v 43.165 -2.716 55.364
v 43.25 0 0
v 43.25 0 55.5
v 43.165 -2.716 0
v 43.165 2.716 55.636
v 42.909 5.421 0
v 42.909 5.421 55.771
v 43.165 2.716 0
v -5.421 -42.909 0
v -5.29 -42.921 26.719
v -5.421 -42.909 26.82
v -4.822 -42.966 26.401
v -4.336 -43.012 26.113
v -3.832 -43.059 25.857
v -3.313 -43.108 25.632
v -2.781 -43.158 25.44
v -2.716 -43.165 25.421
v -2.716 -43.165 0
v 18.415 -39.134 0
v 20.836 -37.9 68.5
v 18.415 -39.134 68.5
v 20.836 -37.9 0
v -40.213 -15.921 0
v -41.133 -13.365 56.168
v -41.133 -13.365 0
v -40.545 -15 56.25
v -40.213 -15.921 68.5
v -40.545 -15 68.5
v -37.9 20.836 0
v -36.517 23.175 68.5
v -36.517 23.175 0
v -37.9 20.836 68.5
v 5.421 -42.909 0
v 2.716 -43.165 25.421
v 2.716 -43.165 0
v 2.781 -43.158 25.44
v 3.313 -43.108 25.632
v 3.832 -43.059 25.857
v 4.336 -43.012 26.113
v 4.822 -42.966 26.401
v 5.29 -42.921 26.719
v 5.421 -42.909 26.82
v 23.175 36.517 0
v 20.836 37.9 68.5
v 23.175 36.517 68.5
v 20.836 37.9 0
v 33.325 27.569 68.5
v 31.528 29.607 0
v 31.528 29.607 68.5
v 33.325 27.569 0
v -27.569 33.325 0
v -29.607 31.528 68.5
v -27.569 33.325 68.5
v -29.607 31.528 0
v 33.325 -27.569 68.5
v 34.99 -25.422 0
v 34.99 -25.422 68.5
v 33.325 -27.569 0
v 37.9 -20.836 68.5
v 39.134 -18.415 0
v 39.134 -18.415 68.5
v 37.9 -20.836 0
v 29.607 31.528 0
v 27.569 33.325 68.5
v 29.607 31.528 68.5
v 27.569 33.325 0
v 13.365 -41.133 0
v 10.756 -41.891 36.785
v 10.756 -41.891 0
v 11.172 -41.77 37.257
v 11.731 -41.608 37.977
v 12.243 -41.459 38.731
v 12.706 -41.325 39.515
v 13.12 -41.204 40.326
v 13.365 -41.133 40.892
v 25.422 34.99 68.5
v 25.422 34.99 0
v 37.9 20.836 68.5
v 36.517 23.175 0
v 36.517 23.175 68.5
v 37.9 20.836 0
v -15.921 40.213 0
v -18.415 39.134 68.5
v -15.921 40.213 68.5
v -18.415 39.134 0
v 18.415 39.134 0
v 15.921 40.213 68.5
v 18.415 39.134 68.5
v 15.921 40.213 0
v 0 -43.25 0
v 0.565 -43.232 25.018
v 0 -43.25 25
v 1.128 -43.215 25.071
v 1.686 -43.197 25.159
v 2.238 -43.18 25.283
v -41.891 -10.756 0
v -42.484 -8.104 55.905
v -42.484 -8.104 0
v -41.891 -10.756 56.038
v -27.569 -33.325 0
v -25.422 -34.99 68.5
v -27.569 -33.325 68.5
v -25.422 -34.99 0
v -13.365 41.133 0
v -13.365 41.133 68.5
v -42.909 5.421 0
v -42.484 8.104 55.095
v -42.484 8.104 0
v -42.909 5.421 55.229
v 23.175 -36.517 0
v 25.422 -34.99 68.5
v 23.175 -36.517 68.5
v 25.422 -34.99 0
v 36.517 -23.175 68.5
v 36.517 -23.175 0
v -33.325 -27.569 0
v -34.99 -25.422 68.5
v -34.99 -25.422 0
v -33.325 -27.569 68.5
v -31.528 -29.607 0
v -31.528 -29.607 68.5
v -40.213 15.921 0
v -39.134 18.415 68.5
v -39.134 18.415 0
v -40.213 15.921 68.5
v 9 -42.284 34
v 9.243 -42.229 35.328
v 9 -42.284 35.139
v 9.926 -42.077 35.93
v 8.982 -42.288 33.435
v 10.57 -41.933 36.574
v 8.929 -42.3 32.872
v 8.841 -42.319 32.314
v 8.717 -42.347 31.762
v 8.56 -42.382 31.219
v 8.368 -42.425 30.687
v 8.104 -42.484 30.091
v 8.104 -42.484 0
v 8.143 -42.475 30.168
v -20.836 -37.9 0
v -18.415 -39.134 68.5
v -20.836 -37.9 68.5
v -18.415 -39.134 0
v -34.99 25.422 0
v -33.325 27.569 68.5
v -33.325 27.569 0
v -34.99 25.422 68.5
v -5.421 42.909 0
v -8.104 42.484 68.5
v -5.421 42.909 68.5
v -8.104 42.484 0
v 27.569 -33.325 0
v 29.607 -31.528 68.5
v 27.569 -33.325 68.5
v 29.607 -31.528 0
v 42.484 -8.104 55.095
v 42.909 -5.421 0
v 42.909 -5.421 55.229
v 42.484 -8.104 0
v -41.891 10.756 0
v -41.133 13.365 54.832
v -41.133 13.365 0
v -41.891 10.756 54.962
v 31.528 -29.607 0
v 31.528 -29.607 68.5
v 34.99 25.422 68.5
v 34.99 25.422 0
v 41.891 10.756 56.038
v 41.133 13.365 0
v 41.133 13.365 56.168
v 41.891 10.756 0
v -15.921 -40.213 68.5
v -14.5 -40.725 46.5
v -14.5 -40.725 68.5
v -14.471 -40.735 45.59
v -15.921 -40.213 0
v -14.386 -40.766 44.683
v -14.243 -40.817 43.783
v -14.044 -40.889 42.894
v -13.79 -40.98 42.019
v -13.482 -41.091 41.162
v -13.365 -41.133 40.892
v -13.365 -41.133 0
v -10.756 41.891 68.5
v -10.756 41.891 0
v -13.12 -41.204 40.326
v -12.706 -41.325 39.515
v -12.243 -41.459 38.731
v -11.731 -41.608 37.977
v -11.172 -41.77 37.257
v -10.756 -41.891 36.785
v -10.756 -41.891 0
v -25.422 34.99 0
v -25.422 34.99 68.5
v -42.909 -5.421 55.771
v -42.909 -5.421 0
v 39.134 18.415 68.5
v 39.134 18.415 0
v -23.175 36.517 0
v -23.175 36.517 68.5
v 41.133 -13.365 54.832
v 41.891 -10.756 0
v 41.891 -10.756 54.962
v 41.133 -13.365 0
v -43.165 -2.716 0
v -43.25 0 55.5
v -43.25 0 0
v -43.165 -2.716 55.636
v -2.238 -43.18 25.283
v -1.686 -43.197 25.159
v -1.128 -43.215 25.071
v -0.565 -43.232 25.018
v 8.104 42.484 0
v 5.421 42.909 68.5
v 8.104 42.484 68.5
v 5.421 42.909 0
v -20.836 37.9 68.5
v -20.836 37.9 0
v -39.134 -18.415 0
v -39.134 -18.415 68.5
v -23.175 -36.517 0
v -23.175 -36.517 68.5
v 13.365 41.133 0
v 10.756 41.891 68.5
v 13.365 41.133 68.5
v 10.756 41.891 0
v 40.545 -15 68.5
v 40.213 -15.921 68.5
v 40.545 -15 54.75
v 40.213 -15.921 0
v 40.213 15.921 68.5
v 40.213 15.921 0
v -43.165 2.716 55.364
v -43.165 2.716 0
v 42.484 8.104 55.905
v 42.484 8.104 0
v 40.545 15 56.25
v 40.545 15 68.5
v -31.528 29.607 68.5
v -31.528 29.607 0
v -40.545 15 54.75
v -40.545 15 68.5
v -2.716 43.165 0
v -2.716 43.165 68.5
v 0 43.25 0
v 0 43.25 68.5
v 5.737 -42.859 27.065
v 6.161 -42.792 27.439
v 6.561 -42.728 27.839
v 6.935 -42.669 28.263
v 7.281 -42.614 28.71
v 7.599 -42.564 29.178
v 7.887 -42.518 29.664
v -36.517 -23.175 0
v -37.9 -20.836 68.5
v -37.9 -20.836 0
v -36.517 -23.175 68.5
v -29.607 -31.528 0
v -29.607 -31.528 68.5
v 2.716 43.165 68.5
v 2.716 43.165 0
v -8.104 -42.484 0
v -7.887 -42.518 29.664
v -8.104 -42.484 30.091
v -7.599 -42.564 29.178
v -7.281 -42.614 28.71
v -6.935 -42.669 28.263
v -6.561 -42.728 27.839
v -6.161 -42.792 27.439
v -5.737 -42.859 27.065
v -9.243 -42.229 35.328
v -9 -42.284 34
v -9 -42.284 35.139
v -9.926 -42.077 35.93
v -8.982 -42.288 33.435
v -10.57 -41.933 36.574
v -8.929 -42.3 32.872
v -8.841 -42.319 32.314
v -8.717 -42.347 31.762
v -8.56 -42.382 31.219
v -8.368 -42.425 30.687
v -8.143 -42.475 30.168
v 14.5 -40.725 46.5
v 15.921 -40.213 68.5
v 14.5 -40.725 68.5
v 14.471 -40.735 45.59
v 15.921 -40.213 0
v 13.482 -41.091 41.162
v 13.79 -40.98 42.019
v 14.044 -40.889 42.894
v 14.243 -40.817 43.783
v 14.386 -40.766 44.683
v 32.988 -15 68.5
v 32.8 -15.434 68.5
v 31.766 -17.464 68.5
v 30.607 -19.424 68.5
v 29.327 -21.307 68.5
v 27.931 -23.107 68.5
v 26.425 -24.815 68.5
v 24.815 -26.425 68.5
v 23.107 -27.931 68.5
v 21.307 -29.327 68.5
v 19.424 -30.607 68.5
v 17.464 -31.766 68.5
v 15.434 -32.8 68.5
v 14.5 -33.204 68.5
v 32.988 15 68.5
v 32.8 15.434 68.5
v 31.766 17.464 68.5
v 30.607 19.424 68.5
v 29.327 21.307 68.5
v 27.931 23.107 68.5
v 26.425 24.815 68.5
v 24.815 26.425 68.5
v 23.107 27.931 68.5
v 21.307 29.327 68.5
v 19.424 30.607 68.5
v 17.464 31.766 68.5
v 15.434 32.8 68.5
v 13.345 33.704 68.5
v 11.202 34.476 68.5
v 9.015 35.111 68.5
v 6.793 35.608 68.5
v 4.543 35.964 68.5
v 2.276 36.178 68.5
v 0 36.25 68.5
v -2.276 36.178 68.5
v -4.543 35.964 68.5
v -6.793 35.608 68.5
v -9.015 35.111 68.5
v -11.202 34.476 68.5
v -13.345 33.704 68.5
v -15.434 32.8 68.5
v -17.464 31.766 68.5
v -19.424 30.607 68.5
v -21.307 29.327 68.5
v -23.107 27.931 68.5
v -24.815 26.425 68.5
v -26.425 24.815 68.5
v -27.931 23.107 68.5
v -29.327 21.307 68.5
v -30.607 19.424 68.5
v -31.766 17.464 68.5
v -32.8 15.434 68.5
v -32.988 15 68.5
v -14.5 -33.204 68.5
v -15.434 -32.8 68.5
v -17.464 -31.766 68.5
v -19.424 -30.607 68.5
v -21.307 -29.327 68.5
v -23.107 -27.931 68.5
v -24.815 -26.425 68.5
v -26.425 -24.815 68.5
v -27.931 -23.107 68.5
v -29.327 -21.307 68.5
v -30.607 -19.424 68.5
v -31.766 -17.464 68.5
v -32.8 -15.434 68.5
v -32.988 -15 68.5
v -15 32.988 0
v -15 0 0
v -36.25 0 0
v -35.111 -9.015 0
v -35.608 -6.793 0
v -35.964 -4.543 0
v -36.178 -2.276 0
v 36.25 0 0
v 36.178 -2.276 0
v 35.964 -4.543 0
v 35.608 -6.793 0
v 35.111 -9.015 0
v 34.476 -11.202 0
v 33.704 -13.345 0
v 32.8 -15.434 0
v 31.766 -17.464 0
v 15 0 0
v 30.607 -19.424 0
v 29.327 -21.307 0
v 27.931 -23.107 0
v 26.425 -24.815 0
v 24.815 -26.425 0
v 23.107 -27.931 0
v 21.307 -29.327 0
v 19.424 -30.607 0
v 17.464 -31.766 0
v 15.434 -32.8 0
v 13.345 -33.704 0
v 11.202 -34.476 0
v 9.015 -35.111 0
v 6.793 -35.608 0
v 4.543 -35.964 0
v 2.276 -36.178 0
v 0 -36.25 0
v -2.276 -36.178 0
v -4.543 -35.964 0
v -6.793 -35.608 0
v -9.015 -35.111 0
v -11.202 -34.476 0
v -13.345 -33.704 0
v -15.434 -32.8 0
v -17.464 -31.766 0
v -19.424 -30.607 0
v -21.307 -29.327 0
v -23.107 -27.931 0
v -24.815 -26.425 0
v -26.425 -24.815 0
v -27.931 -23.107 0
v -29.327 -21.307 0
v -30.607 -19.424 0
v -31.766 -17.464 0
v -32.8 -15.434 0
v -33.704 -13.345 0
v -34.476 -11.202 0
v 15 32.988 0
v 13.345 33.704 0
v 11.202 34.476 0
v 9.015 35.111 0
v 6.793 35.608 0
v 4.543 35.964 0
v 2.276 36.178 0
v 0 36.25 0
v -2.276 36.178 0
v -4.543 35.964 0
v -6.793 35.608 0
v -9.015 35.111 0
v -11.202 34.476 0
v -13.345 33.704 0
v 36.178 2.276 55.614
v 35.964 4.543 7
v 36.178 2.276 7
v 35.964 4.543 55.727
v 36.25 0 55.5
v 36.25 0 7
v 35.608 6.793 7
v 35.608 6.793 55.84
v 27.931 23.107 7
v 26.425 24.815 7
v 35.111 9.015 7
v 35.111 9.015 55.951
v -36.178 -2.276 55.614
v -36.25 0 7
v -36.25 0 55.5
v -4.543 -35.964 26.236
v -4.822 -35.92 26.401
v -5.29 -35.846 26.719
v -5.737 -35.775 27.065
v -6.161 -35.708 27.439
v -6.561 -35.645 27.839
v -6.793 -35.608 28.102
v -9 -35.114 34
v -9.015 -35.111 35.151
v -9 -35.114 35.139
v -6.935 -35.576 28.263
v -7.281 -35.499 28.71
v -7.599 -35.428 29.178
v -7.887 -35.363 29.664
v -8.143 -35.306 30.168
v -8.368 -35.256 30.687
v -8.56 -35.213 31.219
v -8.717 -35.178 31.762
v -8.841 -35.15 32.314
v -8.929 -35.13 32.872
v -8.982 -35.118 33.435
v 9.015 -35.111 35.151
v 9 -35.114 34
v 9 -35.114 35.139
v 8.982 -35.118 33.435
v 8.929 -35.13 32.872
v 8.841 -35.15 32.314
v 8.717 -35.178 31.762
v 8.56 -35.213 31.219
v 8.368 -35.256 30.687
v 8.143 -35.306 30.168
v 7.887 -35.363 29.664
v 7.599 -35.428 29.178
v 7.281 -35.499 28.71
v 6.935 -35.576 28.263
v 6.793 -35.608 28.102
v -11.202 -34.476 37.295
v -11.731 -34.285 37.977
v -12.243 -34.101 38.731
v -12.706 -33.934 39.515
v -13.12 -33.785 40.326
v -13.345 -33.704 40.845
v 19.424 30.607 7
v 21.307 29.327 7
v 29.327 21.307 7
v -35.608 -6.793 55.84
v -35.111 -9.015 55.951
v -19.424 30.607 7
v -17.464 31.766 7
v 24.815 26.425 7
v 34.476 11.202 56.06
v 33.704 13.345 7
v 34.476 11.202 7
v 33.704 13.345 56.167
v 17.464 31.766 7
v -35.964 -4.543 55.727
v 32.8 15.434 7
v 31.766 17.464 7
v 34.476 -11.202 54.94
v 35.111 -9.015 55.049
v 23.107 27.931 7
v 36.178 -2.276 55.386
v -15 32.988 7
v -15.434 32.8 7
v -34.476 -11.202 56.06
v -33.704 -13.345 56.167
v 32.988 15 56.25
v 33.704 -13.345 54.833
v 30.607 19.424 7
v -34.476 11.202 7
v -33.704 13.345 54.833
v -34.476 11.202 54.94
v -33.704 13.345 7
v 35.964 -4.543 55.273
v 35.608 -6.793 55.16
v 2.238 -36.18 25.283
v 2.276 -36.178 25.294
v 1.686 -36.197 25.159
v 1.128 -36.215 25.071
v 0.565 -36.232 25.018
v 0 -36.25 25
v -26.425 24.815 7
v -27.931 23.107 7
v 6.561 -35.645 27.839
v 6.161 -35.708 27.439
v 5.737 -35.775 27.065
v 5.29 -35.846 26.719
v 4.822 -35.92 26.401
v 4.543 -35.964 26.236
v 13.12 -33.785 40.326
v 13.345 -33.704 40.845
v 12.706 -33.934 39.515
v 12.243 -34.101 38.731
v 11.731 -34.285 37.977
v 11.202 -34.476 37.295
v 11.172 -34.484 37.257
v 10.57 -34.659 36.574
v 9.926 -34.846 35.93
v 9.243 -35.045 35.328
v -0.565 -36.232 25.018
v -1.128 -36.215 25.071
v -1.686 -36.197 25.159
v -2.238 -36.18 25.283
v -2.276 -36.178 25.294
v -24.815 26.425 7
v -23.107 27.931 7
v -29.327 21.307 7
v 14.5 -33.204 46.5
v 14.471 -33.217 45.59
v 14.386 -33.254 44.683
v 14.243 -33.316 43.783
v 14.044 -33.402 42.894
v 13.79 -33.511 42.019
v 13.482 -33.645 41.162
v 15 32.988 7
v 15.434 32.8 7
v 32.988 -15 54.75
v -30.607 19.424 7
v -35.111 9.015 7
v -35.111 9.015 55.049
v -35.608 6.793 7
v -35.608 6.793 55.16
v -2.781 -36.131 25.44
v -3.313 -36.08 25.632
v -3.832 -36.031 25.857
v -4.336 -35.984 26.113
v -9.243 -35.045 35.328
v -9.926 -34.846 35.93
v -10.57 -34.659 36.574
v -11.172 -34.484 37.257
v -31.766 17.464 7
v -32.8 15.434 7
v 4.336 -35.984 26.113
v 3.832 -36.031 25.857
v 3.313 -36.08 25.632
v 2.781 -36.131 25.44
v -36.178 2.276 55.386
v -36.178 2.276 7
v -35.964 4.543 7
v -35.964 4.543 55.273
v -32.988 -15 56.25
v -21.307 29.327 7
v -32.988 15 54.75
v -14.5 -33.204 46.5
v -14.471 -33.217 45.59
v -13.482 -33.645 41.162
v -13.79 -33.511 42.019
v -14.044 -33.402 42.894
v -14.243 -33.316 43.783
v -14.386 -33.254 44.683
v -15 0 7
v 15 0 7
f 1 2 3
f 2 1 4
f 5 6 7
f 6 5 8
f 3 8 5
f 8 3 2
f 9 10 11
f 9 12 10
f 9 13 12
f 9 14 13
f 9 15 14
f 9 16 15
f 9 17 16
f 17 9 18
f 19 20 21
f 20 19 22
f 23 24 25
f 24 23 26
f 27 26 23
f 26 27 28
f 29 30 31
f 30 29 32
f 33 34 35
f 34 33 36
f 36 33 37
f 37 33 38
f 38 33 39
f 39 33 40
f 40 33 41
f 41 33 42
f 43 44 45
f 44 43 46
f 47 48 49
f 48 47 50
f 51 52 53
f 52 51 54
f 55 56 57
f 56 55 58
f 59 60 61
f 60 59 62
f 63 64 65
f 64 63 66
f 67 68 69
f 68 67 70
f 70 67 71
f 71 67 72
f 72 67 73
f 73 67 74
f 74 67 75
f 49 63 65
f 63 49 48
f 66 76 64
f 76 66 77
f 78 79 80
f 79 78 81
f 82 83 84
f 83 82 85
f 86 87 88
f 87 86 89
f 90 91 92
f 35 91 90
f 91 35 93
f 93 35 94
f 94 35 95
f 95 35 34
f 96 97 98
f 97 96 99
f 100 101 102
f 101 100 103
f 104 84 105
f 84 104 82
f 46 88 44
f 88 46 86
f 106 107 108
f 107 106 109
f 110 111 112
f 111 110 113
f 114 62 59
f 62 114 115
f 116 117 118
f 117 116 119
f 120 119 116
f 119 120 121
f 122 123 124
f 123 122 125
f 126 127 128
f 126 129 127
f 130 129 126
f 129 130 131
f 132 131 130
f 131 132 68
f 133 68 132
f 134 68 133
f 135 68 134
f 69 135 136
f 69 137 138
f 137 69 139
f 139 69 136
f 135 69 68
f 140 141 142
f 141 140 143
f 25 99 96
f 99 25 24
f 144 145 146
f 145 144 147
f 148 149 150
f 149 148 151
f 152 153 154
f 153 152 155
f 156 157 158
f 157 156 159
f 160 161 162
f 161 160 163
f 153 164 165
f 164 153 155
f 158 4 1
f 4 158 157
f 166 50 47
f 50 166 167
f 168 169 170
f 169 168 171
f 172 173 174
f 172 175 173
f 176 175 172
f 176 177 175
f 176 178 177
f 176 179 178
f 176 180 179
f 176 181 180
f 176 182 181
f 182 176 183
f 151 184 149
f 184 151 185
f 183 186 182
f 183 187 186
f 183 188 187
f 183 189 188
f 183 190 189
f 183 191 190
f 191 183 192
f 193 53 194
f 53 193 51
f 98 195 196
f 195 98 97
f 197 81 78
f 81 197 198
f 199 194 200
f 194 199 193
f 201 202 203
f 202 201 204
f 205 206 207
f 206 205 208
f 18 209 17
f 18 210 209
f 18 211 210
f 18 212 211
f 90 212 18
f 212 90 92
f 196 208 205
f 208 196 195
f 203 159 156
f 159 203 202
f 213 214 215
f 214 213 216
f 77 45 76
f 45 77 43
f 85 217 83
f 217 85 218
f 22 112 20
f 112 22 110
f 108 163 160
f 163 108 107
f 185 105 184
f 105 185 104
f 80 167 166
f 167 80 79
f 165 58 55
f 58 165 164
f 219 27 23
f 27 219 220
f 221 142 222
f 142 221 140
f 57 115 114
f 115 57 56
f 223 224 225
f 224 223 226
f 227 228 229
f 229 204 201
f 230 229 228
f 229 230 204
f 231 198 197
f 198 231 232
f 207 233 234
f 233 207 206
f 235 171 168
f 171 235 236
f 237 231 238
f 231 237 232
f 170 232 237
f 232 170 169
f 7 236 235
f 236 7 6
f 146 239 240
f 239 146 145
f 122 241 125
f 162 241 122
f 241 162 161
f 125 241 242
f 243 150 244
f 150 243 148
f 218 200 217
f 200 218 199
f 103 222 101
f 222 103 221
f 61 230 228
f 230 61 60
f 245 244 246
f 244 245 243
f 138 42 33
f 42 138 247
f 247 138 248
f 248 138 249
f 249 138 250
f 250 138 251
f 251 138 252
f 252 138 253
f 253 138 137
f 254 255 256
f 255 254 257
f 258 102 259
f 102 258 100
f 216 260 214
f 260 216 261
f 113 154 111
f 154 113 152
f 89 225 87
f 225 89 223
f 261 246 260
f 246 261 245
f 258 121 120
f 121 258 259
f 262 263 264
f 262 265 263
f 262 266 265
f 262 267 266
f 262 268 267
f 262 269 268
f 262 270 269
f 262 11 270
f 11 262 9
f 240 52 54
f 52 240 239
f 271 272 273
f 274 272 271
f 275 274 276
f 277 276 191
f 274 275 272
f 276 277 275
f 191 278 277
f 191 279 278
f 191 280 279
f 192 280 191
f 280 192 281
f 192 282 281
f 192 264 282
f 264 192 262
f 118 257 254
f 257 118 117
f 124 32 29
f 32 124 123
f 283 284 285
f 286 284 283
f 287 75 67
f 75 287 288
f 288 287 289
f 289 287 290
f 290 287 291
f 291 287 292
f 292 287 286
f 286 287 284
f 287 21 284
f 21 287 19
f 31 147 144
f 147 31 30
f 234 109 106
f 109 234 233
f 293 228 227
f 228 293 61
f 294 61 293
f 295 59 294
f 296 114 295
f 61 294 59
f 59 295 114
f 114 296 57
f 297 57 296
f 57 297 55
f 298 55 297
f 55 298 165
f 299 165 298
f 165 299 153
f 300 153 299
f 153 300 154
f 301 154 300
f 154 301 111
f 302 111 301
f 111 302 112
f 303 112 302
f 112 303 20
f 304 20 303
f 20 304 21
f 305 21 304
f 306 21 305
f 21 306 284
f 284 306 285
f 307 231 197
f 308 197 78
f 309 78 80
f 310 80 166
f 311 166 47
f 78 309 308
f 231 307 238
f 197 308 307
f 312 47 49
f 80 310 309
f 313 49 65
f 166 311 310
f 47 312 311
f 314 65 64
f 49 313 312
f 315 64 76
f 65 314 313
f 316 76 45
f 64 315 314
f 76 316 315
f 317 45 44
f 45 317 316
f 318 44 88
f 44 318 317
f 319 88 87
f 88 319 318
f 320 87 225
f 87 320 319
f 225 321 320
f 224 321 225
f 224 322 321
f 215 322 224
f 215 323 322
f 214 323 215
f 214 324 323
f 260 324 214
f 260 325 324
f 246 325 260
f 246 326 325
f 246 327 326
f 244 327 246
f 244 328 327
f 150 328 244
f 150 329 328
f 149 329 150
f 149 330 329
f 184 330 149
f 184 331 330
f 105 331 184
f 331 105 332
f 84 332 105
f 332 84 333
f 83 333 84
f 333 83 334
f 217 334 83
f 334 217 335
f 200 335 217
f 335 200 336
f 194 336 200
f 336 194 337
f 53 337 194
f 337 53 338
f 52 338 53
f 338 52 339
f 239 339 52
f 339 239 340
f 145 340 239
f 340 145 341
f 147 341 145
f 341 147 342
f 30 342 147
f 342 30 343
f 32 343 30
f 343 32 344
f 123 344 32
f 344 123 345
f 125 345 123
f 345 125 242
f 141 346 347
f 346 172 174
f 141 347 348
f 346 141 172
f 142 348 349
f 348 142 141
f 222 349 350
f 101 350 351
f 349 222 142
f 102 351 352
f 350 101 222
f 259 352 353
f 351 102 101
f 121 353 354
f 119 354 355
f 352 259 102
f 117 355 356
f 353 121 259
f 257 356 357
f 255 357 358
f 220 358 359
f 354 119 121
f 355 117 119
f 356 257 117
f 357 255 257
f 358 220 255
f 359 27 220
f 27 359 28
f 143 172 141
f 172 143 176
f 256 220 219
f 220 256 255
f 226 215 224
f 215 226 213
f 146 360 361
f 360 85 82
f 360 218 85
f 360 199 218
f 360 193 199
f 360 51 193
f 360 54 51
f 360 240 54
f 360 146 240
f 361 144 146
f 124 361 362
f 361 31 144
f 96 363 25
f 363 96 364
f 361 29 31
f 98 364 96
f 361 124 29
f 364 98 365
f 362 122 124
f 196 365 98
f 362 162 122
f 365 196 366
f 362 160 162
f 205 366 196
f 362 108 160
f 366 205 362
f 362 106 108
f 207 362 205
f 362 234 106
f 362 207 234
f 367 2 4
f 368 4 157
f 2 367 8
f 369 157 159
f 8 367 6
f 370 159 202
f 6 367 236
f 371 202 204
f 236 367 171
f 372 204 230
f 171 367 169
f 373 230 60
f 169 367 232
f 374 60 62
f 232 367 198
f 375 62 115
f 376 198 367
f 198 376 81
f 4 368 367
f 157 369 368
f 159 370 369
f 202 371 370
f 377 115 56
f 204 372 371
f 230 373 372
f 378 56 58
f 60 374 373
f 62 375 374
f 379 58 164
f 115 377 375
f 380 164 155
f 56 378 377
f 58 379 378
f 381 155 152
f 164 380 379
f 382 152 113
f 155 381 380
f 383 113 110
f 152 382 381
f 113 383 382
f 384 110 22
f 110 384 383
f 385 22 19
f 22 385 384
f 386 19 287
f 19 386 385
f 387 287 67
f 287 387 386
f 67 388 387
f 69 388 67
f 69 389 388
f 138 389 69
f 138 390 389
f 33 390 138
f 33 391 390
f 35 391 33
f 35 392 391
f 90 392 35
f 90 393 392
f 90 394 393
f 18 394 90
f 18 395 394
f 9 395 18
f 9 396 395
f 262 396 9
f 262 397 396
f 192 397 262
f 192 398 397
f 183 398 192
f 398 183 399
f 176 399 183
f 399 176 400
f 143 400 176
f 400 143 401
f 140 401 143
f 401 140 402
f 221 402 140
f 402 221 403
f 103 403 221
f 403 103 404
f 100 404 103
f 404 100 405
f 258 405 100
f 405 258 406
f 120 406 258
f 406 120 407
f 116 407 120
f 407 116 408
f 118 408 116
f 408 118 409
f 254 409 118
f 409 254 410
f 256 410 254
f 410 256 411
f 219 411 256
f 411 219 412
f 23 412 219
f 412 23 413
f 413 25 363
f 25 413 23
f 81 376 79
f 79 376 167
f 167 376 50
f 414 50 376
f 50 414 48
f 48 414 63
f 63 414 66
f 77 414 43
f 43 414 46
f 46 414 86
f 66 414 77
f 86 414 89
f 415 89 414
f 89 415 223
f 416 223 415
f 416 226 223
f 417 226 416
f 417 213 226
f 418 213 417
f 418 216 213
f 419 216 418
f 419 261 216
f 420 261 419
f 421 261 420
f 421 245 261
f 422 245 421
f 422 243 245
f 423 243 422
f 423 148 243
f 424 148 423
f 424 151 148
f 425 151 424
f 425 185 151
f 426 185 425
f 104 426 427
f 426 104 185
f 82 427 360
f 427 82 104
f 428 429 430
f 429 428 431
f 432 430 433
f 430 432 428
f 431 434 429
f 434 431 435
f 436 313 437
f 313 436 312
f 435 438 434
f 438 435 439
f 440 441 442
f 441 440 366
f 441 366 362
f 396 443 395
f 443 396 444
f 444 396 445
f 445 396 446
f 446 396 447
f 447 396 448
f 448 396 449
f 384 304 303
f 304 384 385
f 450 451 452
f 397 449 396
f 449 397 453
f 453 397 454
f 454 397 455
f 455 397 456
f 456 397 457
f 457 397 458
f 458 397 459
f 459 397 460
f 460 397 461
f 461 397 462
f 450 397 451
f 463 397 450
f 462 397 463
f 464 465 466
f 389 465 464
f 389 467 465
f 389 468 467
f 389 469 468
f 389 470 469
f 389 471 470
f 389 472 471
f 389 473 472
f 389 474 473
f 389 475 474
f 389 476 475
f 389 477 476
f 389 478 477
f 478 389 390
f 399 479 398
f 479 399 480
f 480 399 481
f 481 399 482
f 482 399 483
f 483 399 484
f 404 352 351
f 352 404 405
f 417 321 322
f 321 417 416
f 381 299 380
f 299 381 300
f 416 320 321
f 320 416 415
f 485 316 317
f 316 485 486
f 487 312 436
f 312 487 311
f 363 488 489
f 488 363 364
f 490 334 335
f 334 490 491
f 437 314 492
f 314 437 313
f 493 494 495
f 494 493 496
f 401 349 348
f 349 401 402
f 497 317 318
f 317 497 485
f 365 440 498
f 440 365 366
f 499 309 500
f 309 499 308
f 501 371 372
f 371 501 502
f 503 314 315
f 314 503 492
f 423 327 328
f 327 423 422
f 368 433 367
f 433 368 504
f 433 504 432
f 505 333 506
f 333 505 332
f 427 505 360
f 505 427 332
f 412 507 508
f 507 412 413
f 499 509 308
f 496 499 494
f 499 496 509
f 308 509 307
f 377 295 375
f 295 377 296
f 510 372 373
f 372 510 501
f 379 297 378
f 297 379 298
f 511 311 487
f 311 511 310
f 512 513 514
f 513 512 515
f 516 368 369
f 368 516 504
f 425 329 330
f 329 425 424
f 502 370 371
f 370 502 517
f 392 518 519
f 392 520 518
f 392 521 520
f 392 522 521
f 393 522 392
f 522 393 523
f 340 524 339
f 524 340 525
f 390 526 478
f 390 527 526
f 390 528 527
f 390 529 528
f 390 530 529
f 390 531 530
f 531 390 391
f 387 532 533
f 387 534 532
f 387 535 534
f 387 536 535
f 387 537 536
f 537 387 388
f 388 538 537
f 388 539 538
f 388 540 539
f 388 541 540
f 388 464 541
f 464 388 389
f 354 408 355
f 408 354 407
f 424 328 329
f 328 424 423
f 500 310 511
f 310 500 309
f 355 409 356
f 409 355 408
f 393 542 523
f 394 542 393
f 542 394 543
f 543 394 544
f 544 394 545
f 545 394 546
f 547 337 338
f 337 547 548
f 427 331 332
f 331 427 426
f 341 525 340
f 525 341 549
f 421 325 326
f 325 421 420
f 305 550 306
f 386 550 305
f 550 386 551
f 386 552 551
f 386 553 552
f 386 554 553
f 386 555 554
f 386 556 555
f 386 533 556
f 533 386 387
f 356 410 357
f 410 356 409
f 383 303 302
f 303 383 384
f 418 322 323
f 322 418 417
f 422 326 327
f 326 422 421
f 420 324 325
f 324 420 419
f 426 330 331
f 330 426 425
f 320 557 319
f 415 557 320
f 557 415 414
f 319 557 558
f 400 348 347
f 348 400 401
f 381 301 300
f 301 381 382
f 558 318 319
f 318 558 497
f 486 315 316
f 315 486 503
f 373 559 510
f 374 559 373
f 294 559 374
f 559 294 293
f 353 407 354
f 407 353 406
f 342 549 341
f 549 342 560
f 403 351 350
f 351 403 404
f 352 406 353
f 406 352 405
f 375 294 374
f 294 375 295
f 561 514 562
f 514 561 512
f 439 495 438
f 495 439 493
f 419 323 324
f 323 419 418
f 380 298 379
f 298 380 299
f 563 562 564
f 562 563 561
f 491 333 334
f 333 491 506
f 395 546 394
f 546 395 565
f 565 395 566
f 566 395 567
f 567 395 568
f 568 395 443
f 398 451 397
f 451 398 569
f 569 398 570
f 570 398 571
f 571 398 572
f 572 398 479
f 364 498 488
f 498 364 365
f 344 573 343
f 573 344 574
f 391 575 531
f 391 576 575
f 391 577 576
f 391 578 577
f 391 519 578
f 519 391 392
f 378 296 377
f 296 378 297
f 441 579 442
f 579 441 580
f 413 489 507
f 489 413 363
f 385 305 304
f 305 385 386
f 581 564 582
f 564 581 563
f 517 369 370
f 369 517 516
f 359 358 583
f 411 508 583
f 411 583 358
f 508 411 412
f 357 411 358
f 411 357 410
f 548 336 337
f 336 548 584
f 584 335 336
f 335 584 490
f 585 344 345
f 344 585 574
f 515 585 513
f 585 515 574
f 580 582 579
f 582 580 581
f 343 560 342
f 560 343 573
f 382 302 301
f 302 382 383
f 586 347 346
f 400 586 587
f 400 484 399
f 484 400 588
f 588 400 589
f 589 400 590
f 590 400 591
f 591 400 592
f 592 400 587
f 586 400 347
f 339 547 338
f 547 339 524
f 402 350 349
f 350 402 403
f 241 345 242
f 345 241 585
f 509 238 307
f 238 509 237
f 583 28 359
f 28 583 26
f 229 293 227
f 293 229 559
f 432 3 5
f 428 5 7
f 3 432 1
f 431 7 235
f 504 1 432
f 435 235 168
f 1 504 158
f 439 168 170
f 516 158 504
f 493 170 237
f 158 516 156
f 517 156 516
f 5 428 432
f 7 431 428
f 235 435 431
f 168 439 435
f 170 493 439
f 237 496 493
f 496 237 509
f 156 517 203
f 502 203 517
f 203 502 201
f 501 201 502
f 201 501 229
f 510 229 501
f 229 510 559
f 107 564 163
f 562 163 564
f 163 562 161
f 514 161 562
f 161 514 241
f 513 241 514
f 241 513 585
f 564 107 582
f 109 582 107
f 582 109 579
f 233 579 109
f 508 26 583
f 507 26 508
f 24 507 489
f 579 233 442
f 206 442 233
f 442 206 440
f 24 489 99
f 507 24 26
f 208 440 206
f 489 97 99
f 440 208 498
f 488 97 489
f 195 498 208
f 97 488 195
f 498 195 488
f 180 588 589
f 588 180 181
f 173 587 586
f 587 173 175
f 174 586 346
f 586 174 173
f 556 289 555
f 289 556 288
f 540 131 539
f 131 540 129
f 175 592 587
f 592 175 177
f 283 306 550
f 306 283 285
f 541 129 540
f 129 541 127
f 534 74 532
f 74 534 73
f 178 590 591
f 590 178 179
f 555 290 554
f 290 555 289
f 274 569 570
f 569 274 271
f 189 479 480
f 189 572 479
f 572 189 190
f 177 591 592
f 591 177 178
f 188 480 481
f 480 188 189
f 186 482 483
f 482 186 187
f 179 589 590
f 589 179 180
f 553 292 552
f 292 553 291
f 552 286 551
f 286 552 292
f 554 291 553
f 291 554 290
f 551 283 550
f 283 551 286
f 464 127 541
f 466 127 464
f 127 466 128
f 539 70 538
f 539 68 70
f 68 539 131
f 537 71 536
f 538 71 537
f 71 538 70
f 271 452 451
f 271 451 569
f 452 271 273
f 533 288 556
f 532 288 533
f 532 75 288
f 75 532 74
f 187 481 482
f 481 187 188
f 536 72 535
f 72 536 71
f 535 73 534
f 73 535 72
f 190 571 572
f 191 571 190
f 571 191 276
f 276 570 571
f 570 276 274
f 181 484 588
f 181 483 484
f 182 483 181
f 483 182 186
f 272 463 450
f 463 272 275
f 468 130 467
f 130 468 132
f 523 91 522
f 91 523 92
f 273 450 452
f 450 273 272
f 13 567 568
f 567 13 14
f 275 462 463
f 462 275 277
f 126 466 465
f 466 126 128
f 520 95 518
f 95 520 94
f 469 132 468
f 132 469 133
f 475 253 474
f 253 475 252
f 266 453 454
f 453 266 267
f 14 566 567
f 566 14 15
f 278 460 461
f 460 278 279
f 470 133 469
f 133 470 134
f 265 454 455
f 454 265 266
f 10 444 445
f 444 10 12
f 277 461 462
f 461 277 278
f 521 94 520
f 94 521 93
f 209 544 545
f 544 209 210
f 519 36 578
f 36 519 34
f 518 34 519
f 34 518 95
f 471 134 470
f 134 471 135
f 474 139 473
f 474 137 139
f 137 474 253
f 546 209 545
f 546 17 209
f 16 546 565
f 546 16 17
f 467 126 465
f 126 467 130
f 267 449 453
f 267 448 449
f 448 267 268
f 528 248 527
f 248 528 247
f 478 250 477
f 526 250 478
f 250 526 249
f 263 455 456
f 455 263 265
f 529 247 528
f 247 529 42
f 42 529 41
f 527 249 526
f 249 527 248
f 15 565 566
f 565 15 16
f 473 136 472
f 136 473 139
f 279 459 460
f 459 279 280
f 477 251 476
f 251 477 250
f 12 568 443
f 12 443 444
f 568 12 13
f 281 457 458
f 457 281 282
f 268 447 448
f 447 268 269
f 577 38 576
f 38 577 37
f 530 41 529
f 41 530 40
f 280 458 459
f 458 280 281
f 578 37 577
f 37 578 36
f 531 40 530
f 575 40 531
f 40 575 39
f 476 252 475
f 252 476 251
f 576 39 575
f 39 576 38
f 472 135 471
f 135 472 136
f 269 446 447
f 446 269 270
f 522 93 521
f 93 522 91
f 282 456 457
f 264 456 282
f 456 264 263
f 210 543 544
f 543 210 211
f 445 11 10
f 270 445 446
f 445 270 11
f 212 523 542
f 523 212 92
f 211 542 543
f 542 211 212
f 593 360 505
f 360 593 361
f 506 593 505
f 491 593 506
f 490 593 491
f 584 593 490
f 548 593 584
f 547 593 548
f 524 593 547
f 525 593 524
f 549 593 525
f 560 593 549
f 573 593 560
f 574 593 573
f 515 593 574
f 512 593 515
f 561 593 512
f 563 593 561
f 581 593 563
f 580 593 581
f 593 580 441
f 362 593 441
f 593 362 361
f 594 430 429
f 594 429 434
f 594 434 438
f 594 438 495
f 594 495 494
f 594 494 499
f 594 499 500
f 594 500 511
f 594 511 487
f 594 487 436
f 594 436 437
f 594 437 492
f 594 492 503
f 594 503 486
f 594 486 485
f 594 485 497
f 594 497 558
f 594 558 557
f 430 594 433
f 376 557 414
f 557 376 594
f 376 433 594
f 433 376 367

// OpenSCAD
$fn=100;

// Constants
wall_thickness=7;
floor_thickness=2;
inner_diameter=72.5;
outer_diameter=inner_diameter+2.0*wall_thickness;

tamper_base_diameter=58.5;
tamper_base_height=12;
tamper_handle_diameter=27;
tamper_handle_height=55;
tamper_handle_cutout_diameter=tamper_handle_diameter+2;
tamper_handle_cutout_height=32; // Actually the height at which the cutout starts.
tamper_angle=75;
tamper_y_offset=-8; // Needs to be hand tuned to avoid collision!
tamper_rest_height=7;
tamper_rest_offset=15;

portafilter_handle_cutout_diameter=18;
portafilter_handle_cutout_height=25; // Actually the height at which the cutout starts.
portafilter_ears_width=20; // The distance between the two height measurements below.
portafilter_ears_height_1=55;
portafilter_ears_height_2=56;
portafilter_ears_cutout_width=30;
portafilter_ears_tilt_angle=atan2((portafilter_ears_height_2-portafilter_ears_height_1), portafilter_ears_width);
echo(portafilter_ears_tilt_angle);

station_base_offset=0;
station_height=tamper_base_diameter+10+station_base_offset;

// Create a hull of two to four circles
// Usage: RoundedCornerPolygon([x1, y1, r1], ..., [x4, y4, r4])
module RoundedCornerPolygon(A=[0, 0, 0], B=[0, 0, 0], C=[0, 0, -1], D=[0, 0, -1]) {

	// adapted from http://www.thingiverse.com/thing:9347 {
	hull() {

		translate([A[0], A[1], 0])
		circle(r=A[2]);

		if (B[2]!=-1) {

            translate([B[0], B[1], 0])
            circle(r=B[2]);

            if (C[2]!=-1) {

                translate([C[0], C[1], 0])
                circle(r=C[2]);

                if (D[2]!=-1) {

                    translate([D[0], D[1], 0])
                    circle(r=D[2]);

                }

            }

        }

    }

}

module TamperShape() {
    union() {
        cylinder(tamper_base_height, d=tamper_base_diameter);
        cylinder(tamper_handle_height, d=tamper_handle_diameter);
    }
}
module Tamper() {
    y_offset=tamper_y_offset+0.5*inner_diameter-0.5*tamper_base_diameter*cos(tamper_angle);
    echo(y_offset);
    translate([0, y_offset, 1*(floor_thickness+0.5*tamper_base_diameter)])
        rotate(tamper_angle, [1, 0, 0])
            TamperShape();
}
module Funnel() {
    translate([0, 0, station_height-8])
        cylinder(36, d=outer_diameter);
}

module Cutout(height, diameter) {
    translate([0, -0.5*0.5*(outer_diameter+inner_diameter), station_base_offset+height+0.5*diameter])
        rotate(90, [1,0,0])
            translate([0, 0, -wall_thickness])
                linear_extrude(height=2*wall_thickness)
                    RoundedCornerPolygon(
                        [0.0, 0.0, 0.5*diameter],
                        [0.0, station_height, 0.5*diameter]
                    );
}
module TamperCutout() {
    Cutout(tamper_handle_cutout_height, tamper_handle_cutout_diameter);
}
module PortaFilterCutout() {
    Cutout(portafilter_handle_cutout_height, portafilter_handle_cutout_diameter);
}

module EarCutout() {
    intersection() {
        translate([0, -0.5*portafilter_ears_cutout_width, 0])
            cube([0.5*outer_diameter, portafilter_ears_cutout_width, station_height]);
        translate([0, 0, 0.5*(portafilter_ears_height_2+portafilter_ears_height_1)])
            rotate(portafilter_ears_tilt_angle, [1,0,0])
                translate([0, -0.5*outer_diameter, station_base_offset])
                    cube([0.5*outer_diameter, outer_diameter, station_height]);
    }
}
module EarsCutout() {
    union() {
        EarCutout();
        rotate(180, [0,0,1])
            EarCutout();
    }
}
module TamperRest() {
    intersection() {
        cylinder(station_height, d=outer_diameter);
        union() {
            translate([-outer_diameter-tamper_rest_offset, 0, 0])
                cube([outer_diameter, outer_diameter, tamper_rest_height], false);
            translate([tamper_rest_offset, 0, 0])
                cube([outer_diameter, outer_diameter, tamper_rest_height], false);
        }
    }
}

module TampingStationBase() {
    difference() {
        cylinder(station_height, d=outer_diameter);
        cylinder(station_height, d=inner_diameter);
    }
}

module TampingStation() {
    union() {
        difference() {
            TampingStationBase();
            TamperCutout();
            PortaFilterCutout();
            EarsCutout();
        }
        TamperRest();
    }
}

// Cross-section.
difference() {
    union() {//intersection() {//
        TampingStation();
        //Tamper();
        //Funnel();
    }
    //translate([0, -100, 0])
    //    cube(200, true);
}
